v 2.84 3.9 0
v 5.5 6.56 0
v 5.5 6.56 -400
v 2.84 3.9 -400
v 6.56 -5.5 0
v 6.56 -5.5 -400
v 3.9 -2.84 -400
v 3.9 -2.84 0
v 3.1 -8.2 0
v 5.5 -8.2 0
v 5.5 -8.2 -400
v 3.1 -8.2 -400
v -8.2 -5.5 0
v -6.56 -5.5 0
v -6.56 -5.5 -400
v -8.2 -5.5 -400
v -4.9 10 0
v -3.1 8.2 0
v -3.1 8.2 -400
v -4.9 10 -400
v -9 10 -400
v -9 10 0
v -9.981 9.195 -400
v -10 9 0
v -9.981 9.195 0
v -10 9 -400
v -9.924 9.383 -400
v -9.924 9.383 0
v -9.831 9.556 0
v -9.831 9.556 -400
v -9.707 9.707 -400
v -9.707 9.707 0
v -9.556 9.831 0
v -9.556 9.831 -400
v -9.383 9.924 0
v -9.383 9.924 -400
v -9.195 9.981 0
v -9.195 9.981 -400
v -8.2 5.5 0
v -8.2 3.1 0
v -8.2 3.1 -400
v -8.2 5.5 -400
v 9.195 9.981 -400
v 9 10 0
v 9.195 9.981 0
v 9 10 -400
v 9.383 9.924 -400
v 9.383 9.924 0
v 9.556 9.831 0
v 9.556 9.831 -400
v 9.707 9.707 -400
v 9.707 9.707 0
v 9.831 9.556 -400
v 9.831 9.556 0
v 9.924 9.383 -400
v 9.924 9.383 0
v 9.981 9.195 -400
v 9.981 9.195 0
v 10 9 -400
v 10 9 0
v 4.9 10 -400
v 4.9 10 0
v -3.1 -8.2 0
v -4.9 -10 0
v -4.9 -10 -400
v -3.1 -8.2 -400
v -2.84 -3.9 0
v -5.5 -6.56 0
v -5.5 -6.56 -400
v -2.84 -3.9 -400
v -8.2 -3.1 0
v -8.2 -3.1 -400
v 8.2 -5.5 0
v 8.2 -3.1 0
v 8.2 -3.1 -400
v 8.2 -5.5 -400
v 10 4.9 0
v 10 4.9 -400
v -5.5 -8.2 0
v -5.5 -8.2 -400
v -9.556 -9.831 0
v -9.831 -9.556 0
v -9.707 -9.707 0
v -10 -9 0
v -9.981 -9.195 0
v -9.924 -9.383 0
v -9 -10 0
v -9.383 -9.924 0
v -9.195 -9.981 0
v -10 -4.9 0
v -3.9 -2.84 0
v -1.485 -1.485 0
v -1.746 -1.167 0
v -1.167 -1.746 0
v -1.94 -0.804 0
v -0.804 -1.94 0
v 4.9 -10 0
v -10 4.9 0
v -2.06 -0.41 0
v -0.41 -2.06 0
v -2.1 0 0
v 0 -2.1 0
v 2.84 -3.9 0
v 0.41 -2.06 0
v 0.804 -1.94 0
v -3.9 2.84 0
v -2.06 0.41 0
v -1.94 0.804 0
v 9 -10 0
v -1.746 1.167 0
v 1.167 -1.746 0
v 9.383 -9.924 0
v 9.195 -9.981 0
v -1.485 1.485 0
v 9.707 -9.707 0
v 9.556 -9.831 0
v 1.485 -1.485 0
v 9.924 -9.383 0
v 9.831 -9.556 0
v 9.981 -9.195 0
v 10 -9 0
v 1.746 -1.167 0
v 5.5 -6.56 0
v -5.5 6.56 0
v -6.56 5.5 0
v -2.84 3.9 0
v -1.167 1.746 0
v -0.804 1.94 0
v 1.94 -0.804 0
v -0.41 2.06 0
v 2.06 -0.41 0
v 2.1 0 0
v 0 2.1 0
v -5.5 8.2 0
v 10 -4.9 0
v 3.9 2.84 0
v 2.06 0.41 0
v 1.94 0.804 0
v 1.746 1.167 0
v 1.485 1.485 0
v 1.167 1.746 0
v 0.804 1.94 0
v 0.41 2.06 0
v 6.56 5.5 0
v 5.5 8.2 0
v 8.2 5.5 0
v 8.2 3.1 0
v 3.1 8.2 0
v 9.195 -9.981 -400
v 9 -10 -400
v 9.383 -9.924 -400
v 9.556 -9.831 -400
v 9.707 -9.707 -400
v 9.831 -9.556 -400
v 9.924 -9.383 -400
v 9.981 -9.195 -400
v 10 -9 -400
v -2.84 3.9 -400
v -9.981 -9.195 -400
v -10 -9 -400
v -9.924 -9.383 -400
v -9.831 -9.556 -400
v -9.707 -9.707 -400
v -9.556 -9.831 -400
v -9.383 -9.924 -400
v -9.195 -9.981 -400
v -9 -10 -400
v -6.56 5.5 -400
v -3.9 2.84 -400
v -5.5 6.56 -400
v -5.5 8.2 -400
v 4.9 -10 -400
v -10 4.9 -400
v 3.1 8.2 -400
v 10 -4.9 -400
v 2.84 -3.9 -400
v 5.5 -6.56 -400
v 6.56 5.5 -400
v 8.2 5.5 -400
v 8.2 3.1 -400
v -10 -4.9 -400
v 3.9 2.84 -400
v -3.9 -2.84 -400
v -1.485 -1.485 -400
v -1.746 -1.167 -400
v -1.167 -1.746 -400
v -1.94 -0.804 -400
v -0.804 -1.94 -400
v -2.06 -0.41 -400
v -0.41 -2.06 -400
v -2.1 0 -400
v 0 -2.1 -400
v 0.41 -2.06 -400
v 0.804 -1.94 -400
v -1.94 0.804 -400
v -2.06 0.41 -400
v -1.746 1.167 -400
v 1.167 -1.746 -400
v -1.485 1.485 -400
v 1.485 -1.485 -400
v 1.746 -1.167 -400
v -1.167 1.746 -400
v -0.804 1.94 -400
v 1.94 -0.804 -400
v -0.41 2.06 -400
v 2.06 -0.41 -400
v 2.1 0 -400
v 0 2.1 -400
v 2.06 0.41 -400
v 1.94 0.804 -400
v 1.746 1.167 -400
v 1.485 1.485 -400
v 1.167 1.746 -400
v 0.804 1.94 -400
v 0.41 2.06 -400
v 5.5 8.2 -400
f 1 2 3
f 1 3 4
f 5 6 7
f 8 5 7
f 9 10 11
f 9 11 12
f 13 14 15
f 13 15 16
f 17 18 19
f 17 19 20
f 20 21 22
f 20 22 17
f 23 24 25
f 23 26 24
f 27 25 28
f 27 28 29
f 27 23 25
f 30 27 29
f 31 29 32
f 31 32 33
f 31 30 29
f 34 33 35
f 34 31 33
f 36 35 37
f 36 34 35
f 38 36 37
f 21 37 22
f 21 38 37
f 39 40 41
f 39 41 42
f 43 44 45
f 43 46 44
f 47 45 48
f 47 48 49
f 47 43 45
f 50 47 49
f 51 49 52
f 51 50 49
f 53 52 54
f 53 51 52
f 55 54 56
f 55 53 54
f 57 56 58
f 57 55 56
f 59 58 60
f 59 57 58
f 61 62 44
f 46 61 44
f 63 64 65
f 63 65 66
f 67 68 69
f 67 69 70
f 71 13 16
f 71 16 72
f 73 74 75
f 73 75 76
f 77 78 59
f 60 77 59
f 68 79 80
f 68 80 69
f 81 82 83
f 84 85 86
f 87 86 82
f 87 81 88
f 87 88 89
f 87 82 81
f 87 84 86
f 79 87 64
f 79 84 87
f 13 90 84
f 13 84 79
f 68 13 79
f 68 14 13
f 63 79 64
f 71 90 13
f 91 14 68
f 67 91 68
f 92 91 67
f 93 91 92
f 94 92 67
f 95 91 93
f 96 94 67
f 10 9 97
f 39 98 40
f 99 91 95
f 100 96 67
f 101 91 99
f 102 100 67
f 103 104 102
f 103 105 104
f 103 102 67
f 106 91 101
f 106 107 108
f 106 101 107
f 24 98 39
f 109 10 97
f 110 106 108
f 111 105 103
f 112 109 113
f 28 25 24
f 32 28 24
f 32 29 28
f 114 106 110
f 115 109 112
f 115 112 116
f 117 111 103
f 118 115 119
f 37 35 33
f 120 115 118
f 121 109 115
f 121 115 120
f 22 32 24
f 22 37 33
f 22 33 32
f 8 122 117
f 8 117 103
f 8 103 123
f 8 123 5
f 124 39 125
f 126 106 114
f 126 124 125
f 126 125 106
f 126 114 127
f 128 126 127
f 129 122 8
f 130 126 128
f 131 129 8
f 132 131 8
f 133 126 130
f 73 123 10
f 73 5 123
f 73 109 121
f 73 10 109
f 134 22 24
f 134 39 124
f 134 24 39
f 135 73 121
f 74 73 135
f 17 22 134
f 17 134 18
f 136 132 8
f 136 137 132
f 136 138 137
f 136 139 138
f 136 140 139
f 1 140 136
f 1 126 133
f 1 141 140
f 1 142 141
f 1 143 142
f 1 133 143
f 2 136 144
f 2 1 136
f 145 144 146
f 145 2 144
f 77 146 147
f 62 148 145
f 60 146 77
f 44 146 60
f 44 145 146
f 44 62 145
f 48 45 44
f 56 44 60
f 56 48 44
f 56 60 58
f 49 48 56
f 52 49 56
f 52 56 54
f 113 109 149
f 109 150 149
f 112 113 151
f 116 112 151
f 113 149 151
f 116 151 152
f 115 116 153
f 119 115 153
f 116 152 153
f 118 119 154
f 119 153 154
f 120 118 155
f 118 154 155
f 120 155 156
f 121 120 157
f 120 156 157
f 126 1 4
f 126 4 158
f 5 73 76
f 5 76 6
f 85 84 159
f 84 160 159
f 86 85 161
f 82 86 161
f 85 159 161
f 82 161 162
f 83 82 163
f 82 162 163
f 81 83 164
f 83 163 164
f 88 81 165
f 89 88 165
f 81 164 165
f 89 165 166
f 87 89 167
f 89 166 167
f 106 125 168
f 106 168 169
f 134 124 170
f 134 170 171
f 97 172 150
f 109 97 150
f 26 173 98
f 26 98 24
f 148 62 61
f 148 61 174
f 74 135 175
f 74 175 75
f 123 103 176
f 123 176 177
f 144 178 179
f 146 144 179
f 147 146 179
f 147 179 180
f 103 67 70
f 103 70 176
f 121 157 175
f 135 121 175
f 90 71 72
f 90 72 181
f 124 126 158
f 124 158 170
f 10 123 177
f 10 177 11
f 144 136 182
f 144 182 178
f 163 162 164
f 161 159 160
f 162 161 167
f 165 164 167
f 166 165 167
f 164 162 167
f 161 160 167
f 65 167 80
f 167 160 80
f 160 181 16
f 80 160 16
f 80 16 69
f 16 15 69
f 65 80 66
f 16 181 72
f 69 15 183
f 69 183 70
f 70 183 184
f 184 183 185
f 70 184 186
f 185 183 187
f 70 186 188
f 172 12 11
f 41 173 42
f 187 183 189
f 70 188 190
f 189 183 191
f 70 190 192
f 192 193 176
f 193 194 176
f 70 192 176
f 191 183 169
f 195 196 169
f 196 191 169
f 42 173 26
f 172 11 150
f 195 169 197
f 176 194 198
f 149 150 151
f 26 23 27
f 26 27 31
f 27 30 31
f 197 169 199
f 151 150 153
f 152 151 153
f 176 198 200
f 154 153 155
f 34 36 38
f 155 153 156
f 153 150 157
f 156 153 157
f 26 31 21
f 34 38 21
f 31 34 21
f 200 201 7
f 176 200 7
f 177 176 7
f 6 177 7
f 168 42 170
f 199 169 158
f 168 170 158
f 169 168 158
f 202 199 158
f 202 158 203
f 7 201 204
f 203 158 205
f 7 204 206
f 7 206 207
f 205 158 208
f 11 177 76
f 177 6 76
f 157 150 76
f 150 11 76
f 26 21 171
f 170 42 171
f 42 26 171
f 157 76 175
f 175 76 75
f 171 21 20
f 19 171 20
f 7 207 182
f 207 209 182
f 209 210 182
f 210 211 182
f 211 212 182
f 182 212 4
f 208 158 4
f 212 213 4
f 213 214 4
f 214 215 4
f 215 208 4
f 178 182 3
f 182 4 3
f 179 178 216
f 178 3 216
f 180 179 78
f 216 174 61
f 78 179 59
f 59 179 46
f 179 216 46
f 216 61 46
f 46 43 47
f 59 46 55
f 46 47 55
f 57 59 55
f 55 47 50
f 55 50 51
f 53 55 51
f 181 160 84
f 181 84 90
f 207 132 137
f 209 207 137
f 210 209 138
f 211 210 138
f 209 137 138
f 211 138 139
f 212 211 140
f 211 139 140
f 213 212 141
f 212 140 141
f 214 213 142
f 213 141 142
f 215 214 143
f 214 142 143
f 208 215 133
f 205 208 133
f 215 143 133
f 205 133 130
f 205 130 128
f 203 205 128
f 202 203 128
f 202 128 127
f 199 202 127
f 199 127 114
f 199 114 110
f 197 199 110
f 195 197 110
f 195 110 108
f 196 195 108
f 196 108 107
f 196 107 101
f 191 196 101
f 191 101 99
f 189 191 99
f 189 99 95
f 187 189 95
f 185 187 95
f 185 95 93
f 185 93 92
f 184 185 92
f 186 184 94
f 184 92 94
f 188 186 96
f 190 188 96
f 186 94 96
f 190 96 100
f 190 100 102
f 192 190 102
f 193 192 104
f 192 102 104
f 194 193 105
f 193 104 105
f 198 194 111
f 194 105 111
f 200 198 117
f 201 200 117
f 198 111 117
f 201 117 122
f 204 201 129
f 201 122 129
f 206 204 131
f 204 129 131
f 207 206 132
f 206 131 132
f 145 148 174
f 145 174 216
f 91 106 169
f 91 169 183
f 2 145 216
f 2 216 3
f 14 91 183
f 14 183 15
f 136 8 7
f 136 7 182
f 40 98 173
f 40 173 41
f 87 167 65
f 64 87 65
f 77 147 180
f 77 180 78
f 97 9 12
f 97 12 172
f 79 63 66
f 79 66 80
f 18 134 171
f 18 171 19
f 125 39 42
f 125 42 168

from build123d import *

# Parameters (mm, degrees)
SKETCH2_W           = 20
SKETCH2_H           = 20
BOSS_EXTRUDE1_DEPTH = 400
CUT_EXTRUDE1_DEPTH  = 401.249921924
CIRPATTERN2_COUNT   = 4
SKETCH9_R           = 2.1
CUT_EXTRUDE2_DEPTH  = 401.249921924
FILLET1_R           = 1


with BuildPart() as part:
    # Sketch2 → Boss-Extrude1 (new body)
    with BuildSketch(Plane.XY):
        Rectangle(SKETCH2_W, SKETCH2_H)
    extrude(amount=-BOSS_EXTRUDE1_DEPTH)

    # Sketch3 → Cut-Extrude1 (cut, symmetric)
    with BuildSketch(Plane.XY):
        Polygon((-3.1, 8.2), (-4.9, 10), (4.9, 10), (3.1, 8.2), (5.5, 8.2), (5.5, 6.56), (2.84, 3.9), (-2.84, 3.9), (-5.5, 6.56), (-5.5, 8.2), align=None)
    cut_extrude1 = extrude(amount=CUT_EXTRUDE1_DEPTH, both=True, mode=Mode.SUBTRACT)

    # CirPattern2: Cut-Extrude1 ×4 about axis
    cirpattern2_axis = Axis((0, 0, 0), (0, 0, 1))
    for i in range(1, CIRPATTERN2_COUNT):
        add(cut_extrude1.rotate(cirpattern2_axis, i * 360 / CIRPATTERN2_COUNT), mode=Mode.SUBTRACT)

    # Sketch9 → Cut-Extrude2 (cut, through all)
    with BuildSketch(Plane.XY):
        Circle(SKETCH9_R)
    extrude(amount=-CUT_EXTRUDE2_DEPTH, mode=Mode.SUBTRACT)

    # Fillet1
    fillet1_edges = [part.edges().sort_by_distance(p)[0] for p in [
        (-10, 10, -200),
        (10, 10, -200),
        (10, -10, -200),
        (-10, -10, -200),
    ]]
    fillet(fillet1_edges, radius=FILLET1_R)


solid = part.part
